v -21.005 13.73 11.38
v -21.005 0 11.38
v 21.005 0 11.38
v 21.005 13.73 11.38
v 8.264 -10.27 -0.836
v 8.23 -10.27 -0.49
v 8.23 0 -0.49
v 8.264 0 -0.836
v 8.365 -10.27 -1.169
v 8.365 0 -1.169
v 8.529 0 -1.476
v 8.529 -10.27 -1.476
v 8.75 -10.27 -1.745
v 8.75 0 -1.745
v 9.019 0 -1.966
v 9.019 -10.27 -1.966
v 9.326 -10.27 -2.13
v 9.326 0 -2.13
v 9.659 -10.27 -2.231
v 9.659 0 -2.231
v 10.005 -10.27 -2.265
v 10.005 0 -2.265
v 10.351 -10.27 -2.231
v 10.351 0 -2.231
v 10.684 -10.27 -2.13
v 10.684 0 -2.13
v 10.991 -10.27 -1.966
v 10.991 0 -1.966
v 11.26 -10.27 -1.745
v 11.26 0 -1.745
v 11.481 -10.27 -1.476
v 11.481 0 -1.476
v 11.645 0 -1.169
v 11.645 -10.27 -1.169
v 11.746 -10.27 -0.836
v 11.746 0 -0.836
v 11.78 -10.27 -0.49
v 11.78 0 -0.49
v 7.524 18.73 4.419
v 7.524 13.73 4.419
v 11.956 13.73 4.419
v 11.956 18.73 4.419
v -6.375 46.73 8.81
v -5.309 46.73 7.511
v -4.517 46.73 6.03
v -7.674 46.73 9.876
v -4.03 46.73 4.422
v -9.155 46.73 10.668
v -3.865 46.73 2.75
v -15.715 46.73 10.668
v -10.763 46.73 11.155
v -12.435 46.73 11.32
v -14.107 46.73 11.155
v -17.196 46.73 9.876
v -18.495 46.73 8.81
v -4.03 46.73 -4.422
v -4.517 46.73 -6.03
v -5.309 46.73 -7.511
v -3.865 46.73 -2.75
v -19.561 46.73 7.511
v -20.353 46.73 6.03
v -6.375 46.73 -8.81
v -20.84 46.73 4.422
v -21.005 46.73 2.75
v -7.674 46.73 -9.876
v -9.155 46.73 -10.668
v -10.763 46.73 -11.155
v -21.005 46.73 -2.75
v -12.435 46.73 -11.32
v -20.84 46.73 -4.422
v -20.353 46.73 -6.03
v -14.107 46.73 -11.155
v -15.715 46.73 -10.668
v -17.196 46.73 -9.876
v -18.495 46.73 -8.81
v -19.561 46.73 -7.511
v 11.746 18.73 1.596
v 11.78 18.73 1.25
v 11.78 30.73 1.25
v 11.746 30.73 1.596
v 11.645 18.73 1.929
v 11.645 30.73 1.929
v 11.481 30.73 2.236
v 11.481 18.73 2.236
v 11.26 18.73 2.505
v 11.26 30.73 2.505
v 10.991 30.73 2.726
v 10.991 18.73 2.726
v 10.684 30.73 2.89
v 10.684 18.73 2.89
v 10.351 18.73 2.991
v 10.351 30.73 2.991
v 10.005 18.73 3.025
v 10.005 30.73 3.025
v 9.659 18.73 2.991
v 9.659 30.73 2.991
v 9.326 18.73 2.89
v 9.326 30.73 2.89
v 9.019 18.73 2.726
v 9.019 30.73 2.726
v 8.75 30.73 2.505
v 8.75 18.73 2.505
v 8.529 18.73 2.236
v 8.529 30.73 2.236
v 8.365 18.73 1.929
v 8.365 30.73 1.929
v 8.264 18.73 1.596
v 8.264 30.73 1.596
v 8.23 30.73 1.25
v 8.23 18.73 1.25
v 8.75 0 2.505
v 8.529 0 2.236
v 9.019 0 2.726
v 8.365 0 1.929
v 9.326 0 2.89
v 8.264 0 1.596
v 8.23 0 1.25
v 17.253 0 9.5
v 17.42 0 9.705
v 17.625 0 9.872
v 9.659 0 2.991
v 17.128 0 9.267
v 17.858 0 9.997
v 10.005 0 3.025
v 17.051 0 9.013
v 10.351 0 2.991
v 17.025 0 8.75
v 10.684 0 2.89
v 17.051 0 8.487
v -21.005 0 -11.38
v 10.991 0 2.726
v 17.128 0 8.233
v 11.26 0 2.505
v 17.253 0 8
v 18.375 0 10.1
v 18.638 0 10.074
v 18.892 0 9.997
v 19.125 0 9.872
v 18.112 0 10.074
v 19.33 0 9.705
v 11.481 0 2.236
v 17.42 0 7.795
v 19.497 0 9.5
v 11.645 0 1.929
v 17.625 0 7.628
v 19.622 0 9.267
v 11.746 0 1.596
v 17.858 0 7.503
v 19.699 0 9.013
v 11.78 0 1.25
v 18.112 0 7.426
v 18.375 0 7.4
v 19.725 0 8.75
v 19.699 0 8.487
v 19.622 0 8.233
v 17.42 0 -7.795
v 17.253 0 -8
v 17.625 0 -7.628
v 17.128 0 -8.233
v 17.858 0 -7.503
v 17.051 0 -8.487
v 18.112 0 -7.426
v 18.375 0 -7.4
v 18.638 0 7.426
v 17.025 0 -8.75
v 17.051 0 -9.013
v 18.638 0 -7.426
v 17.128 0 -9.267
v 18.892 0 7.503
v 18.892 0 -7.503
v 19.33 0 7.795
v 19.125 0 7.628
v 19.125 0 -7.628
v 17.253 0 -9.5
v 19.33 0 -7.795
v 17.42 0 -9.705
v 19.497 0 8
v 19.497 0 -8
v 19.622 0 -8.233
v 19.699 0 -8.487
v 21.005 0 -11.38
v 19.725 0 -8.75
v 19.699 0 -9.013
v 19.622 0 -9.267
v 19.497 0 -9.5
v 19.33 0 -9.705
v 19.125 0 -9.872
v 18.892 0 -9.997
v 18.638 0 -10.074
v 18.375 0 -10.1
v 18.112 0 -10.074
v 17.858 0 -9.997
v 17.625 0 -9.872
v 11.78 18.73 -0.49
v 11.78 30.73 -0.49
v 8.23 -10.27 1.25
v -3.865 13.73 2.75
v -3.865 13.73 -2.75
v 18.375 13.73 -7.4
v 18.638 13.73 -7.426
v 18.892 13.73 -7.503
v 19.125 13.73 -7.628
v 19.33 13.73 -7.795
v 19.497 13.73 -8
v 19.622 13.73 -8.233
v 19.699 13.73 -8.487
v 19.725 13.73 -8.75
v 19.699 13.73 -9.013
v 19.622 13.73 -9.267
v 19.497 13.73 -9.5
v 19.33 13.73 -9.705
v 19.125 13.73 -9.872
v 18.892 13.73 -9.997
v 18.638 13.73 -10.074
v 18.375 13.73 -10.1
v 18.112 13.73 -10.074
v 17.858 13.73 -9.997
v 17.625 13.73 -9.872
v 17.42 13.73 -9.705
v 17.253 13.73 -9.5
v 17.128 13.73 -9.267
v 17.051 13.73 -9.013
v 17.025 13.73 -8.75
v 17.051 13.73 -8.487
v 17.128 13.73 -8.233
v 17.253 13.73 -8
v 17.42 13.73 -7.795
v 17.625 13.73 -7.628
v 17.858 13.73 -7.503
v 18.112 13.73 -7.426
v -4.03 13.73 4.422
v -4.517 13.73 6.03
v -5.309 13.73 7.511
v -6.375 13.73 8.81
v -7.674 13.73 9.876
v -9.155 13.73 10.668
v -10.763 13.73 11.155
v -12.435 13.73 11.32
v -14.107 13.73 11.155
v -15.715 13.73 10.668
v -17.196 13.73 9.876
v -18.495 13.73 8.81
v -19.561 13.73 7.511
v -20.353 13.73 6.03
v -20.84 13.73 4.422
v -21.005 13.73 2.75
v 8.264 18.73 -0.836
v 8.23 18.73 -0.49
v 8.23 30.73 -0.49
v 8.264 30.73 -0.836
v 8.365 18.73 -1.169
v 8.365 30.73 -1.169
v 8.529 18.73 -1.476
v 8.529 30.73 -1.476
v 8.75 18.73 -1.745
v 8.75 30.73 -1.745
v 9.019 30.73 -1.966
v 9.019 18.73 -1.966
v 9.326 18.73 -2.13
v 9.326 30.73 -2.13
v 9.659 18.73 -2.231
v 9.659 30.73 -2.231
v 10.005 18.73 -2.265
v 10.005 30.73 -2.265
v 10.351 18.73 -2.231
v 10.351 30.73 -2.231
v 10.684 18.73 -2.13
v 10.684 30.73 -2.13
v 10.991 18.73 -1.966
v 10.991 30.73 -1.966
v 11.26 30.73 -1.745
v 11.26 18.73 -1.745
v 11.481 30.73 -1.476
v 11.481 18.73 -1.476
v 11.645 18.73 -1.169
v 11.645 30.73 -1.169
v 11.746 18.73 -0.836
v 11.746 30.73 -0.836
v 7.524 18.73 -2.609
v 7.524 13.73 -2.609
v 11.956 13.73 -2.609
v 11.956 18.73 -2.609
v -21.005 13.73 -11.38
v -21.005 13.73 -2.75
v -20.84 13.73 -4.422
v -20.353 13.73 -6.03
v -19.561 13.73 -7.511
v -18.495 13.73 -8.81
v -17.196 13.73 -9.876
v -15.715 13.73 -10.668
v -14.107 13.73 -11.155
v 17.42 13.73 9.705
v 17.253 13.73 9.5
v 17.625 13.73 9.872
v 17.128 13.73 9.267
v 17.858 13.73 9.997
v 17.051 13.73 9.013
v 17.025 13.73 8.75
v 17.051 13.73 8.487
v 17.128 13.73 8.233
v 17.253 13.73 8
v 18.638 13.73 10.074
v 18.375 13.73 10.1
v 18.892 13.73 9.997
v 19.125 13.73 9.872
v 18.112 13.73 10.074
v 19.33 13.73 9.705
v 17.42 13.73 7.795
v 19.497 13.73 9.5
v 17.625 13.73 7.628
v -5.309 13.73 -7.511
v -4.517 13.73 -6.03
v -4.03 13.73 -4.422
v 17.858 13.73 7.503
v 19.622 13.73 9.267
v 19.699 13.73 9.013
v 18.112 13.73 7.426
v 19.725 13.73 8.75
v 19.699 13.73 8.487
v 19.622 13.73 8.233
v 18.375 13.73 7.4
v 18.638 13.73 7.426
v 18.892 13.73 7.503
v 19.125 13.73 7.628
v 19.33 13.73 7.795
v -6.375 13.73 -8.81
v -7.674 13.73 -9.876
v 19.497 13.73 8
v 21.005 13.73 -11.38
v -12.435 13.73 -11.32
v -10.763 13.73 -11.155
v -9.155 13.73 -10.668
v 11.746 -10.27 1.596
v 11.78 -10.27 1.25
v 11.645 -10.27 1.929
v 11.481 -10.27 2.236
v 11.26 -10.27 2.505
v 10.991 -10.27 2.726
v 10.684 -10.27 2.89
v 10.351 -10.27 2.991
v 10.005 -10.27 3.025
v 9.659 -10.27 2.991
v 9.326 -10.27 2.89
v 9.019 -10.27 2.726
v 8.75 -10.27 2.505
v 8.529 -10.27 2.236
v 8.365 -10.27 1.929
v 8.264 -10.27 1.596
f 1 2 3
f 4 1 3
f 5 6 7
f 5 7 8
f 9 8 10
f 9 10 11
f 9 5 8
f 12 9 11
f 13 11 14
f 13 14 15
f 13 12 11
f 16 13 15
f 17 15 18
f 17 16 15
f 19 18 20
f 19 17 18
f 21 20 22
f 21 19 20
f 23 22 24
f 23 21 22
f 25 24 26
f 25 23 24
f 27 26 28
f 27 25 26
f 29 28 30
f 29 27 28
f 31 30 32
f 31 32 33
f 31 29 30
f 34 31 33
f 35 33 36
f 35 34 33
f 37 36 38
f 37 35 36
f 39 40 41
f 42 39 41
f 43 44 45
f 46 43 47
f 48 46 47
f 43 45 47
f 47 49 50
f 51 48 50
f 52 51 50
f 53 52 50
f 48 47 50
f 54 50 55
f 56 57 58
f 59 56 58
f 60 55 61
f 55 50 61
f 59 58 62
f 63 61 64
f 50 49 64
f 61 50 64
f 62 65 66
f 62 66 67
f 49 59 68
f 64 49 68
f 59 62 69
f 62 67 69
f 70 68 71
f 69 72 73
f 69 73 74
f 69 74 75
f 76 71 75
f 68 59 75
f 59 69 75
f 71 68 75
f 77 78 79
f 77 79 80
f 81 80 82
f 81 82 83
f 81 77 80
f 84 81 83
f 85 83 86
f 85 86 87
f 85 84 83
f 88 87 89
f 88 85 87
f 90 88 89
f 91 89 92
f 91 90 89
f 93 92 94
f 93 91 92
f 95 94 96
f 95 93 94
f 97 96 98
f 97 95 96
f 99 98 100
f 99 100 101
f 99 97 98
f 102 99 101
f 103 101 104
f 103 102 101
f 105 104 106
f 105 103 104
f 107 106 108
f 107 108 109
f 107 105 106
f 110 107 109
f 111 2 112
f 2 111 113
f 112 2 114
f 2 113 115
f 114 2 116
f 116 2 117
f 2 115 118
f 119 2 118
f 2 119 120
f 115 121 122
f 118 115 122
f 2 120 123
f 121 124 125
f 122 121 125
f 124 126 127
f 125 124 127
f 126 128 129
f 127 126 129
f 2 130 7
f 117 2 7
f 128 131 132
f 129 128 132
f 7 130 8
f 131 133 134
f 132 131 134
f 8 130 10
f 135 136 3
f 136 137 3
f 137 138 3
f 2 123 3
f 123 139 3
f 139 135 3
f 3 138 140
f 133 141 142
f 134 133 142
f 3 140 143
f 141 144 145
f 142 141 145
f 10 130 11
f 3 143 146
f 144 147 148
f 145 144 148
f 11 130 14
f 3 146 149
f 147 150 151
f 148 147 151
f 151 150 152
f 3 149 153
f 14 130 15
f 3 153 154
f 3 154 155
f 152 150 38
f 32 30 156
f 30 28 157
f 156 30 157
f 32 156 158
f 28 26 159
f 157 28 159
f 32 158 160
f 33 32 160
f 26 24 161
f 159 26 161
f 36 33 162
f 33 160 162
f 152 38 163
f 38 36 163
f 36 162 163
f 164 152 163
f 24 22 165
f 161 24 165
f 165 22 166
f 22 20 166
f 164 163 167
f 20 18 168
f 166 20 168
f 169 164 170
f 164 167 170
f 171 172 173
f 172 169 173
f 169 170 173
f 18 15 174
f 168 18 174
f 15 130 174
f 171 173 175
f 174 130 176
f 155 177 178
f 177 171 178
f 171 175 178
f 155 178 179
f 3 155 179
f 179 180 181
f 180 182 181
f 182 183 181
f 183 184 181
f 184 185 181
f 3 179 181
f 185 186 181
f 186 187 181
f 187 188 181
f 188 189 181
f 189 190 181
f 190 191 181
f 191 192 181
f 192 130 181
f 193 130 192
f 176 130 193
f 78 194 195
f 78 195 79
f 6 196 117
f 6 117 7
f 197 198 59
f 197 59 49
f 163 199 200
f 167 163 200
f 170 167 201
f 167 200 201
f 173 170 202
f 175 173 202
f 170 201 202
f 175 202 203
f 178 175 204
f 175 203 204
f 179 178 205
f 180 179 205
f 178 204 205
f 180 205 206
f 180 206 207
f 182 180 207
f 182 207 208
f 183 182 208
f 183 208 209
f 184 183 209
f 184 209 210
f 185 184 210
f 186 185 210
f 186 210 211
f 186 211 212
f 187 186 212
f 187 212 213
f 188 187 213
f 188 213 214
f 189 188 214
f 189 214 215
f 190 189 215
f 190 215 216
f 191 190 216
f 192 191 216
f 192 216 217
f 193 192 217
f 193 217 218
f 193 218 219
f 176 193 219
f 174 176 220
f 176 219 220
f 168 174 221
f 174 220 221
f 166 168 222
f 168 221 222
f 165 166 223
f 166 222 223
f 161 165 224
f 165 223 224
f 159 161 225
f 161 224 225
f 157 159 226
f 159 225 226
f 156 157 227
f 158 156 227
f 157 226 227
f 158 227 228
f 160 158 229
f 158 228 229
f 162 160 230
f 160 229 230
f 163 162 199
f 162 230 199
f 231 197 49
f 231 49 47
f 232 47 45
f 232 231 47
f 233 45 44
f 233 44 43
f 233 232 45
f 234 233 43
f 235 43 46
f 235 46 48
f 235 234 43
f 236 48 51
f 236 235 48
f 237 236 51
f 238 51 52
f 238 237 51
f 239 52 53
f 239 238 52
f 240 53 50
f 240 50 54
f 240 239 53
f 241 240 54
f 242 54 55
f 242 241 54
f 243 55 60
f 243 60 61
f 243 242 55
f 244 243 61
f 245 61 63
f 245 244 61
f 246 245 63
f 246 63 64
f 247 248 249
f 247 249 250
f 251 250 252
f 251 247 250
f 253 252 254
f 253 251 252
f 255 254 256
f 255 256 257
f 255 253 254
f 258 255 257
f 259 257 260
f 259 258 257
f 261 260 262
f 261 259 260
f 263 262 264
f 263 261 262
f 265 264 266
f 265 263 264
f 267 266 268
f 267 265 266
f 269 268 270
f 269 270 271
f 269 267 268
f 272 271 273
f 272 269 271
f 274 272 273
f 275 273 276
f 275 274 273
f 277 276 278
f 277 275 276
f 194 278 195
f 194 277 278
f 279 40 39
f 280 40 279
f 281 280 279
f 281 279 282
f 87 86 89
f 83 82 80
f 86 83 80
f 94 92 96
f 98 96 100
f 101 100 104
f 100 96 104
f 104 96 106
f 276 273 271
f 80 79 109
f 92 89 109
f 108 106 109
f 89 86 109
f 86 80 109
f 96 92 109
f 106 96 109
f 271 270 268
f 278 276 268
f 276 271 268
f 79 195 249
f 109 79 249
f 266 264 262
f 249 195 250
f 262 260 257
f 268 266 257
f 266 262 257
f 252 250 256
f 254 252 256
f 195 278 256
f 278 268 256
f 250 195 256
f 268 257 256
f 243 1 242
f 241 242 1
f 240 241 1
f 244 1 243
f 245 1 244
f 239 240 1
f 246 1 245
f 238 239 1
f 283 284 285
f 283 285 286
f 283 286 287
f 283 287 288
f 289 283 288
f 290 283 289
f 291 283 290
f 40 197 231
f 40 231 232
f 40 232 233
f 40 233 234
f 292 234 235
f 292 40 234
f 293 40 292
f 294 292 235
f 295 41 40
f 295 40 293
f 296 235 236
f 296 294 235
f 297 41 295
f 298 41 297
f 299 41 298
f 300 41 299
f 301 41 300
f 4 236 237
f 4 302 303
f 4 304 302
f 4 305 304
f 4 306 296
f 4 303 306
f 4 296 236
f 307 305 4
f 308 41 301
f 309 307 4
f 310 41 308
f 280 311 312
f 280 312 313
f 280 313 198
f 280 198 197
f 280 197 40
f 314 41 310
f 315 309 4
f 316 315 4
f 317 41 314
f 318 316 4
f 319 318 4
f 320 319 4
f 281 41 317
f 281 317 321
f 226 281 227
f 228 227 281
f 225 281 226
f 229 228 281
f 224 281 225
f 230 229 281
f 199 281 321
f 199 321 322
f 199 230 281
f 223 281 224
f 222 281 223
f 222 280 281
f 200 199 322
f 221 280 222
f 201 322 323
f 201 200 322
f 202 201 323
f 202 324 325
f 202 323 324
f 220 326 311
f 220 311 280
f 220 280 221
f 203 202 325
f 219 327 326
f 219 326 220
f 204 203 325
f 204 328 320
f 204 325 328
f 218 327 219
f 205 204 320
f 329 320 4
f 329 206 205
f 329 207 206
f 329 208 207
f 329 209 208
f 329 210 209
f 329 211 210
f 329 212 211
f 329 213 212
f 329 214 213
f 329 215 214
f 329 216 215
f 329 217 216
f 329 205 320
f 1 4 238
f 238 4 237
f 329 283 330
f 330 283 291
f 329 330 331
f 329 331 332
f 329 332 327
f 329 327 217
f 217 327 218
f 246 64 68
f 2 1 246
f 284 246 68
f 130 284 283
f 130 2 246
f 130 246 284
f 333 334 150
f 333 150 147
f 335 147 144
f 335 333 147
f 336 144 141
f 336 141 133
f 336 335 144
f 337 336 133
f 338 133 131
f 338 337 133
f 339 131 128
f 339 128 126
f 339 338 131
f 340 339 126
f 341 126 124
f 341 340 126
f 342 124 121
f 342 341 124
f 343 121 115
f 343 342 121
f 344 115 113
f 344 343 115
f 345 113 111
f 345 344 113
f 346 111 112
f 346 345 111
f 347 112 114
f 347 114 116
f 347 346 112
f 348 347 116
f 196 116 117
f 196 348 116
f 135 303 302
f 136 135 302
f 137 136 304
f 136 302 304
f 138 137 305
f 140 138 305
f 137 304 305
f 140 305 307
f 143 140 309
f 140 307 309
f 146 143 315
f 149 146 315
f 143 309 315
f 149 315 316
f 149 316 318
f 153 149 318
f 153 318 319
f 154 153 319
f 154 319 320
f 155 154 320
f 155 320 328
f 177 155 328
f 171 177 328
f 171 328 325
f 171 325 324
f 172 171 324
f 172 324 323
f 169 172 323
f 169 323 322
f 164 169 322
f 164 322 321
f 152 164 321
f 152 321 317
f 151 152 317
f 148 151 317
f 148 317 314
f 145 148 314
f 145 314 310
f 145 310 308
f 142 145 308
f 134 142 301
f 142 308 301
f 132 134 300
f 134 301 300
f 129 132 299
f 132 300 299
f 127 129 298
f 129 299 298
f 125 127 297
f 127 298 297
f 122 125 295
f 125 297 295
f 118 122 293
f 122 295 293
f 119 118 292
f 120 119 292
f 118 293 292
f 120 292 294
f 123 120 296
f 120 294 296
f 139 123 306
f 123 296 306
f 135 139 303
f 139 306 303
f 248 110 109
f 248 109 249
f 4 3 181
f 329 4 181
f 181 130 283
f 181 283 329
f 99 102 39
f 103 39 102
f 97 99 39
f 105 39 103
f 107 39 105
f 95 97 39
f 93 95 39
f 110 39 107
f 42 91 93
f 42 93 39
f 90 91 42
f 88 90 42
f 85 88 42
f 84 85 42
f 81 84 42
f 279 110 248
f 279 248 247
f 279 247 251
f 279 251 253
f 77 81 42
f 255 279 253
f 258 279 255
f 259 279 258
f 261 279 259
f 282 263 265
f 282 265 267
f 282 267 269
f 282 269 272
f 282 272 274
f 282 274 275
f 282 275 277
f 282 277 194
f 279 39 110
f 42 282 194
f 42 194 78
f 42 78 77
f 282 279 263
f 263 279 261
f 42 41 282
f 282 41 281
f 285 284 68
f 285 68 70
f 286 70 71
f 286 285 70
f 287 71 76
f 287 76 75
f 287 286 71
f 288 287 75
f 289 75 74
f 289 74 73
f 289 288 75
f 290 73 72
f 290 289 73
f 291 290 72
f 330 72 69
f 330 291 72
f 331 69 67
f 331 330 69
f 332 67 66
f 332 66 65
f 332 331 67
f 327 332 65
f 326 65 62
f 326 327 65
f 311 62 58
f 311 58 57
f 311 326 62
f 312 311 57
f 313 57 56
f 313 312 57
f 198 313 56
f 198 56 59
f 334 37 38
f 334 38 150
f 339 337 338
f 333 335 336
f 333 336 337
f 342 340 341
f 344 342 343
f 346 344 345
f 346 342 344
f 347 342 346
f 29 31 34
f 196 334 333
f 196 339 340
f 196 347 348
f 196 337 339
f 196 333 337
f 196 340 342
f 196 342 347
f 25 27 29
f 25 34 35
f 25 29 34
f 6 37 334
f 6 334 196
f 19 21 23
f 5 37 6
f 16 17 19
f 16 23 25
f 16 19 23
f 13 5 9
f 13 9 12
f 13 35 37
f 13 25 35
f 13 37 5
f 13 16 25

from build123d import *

# Parameters (mm, degrees)
SKETCH1_W                = 42.01
SKETCH1_H                = 22.76
BOSS_EXTRUDE1_DEPTH      = 13.73
BOSS_EXTRUDE2_DEPTH      = 33
BOSS_EXTRUDE3_DEPTH      = 17
BOSS_EXTRUDE3_DEPTH_BACK = 24
SKETCH4_R                = 1.35
CUT_EXTRUDE1_DEPTH       = 17
SKETCH5_W                = 4.431132328
SKETCH5_H                = 7.028163836
BOSS_EXTRUDE4_DEPTH      = 5


with BuildPart() as part:
    # Sketch1 → Boss-Extrude1 (new body)
    with BuildSketch(Plane(origin=(0, 0, 0), x_dir=(1, 0, 0), z_dir=(0, 1, 0))):
        Rectangle(SKETCH1_W, SKETCH1_H)
    extrude(amount=BOSS_EXTRUDE1_DEPTH)

    # Sketch2 → Boss-Extrude2 (add)
    with BuildSketch(Plane(origin=(0, 13.73, 0), x_dir=(1, 0, 0), z_dir=(0, 1, 0))):
        with BuildLine():
            Line((-21.005, -2.75), (-21.005, 2.75))
            ThreePointArc((-21.005, 2.75), (-12.435, 11.32), (-3.865, 2.75))
            Line((-3.865, 2.75), (-3.865, -2.75))
            ThreePointArc((-3.865, -2.75), (-12.435, -11.32), (-21.005, -2.75))
        make_face()
    extrude(amount=BOSS_EXTRUDE2_DEPTH)

    # Sketch3 → Boss-Extrude3 (add, two sides: drawn at the far end of the back side and taken through both)
    with BuildSketch(Plane(origin=(0, 13.73, 0), x_dir=(1, 0, 0), z_dir=(0, 1, 0)).offset(-BOSS_EXTRUDE3_DEPTH_BACK)):
        with BuildLine():
            Line((8.23, -1.25), (8.23, 0.49))
            ThreePointArc((8.23, 0.49), (10.005, 2.265), (11.78, 0.49))
            Line((11.78, 0.49), (11.78, -1.25))
            ThreePointArc((11.78, -1.25), (10.005, -3.025), (8.23, -1.25))
        make_face()
    extrude(amount=BOSS_EXTRUDE3_DEPTH + BOSS_EXTRUDE3_DEPTH_BACK)

    # Sketch4 → Cut-Extrude1 (cut)
    with BuildSketch(Plane(origin=(0, 13.73, 0), x_dir=(1, 0, 0), z_dir=(0, 1, 0))):
        with Locations(Location((18.375, 8.75, 0), (0, 0, 270))):
            Circle(SKETCH4_R)
        with Locations(Location((18.375, -8.75, 0), (0, 0, 270))):
            Circle(SKETCH4_R)
    extrude(amount=-CUT_EXTRUDE1_DEPTH, mode=Mode.SUBTRACT)

    # Sketch5 → Boss-Extrude4 (add)
    with BuildSketch(Plane(origin=(0, 13.73, 0), x_dir=(1, 0, 0), z_dir=(0, 1, 0))):
        with Locations((9.740065893, -0.904904843)):
            Rectangle(SKETCH5_W, SKETCH5_H)
    extrude(amount=BOSS_EXTRUDE4_DEPTH)


solid = part.part
